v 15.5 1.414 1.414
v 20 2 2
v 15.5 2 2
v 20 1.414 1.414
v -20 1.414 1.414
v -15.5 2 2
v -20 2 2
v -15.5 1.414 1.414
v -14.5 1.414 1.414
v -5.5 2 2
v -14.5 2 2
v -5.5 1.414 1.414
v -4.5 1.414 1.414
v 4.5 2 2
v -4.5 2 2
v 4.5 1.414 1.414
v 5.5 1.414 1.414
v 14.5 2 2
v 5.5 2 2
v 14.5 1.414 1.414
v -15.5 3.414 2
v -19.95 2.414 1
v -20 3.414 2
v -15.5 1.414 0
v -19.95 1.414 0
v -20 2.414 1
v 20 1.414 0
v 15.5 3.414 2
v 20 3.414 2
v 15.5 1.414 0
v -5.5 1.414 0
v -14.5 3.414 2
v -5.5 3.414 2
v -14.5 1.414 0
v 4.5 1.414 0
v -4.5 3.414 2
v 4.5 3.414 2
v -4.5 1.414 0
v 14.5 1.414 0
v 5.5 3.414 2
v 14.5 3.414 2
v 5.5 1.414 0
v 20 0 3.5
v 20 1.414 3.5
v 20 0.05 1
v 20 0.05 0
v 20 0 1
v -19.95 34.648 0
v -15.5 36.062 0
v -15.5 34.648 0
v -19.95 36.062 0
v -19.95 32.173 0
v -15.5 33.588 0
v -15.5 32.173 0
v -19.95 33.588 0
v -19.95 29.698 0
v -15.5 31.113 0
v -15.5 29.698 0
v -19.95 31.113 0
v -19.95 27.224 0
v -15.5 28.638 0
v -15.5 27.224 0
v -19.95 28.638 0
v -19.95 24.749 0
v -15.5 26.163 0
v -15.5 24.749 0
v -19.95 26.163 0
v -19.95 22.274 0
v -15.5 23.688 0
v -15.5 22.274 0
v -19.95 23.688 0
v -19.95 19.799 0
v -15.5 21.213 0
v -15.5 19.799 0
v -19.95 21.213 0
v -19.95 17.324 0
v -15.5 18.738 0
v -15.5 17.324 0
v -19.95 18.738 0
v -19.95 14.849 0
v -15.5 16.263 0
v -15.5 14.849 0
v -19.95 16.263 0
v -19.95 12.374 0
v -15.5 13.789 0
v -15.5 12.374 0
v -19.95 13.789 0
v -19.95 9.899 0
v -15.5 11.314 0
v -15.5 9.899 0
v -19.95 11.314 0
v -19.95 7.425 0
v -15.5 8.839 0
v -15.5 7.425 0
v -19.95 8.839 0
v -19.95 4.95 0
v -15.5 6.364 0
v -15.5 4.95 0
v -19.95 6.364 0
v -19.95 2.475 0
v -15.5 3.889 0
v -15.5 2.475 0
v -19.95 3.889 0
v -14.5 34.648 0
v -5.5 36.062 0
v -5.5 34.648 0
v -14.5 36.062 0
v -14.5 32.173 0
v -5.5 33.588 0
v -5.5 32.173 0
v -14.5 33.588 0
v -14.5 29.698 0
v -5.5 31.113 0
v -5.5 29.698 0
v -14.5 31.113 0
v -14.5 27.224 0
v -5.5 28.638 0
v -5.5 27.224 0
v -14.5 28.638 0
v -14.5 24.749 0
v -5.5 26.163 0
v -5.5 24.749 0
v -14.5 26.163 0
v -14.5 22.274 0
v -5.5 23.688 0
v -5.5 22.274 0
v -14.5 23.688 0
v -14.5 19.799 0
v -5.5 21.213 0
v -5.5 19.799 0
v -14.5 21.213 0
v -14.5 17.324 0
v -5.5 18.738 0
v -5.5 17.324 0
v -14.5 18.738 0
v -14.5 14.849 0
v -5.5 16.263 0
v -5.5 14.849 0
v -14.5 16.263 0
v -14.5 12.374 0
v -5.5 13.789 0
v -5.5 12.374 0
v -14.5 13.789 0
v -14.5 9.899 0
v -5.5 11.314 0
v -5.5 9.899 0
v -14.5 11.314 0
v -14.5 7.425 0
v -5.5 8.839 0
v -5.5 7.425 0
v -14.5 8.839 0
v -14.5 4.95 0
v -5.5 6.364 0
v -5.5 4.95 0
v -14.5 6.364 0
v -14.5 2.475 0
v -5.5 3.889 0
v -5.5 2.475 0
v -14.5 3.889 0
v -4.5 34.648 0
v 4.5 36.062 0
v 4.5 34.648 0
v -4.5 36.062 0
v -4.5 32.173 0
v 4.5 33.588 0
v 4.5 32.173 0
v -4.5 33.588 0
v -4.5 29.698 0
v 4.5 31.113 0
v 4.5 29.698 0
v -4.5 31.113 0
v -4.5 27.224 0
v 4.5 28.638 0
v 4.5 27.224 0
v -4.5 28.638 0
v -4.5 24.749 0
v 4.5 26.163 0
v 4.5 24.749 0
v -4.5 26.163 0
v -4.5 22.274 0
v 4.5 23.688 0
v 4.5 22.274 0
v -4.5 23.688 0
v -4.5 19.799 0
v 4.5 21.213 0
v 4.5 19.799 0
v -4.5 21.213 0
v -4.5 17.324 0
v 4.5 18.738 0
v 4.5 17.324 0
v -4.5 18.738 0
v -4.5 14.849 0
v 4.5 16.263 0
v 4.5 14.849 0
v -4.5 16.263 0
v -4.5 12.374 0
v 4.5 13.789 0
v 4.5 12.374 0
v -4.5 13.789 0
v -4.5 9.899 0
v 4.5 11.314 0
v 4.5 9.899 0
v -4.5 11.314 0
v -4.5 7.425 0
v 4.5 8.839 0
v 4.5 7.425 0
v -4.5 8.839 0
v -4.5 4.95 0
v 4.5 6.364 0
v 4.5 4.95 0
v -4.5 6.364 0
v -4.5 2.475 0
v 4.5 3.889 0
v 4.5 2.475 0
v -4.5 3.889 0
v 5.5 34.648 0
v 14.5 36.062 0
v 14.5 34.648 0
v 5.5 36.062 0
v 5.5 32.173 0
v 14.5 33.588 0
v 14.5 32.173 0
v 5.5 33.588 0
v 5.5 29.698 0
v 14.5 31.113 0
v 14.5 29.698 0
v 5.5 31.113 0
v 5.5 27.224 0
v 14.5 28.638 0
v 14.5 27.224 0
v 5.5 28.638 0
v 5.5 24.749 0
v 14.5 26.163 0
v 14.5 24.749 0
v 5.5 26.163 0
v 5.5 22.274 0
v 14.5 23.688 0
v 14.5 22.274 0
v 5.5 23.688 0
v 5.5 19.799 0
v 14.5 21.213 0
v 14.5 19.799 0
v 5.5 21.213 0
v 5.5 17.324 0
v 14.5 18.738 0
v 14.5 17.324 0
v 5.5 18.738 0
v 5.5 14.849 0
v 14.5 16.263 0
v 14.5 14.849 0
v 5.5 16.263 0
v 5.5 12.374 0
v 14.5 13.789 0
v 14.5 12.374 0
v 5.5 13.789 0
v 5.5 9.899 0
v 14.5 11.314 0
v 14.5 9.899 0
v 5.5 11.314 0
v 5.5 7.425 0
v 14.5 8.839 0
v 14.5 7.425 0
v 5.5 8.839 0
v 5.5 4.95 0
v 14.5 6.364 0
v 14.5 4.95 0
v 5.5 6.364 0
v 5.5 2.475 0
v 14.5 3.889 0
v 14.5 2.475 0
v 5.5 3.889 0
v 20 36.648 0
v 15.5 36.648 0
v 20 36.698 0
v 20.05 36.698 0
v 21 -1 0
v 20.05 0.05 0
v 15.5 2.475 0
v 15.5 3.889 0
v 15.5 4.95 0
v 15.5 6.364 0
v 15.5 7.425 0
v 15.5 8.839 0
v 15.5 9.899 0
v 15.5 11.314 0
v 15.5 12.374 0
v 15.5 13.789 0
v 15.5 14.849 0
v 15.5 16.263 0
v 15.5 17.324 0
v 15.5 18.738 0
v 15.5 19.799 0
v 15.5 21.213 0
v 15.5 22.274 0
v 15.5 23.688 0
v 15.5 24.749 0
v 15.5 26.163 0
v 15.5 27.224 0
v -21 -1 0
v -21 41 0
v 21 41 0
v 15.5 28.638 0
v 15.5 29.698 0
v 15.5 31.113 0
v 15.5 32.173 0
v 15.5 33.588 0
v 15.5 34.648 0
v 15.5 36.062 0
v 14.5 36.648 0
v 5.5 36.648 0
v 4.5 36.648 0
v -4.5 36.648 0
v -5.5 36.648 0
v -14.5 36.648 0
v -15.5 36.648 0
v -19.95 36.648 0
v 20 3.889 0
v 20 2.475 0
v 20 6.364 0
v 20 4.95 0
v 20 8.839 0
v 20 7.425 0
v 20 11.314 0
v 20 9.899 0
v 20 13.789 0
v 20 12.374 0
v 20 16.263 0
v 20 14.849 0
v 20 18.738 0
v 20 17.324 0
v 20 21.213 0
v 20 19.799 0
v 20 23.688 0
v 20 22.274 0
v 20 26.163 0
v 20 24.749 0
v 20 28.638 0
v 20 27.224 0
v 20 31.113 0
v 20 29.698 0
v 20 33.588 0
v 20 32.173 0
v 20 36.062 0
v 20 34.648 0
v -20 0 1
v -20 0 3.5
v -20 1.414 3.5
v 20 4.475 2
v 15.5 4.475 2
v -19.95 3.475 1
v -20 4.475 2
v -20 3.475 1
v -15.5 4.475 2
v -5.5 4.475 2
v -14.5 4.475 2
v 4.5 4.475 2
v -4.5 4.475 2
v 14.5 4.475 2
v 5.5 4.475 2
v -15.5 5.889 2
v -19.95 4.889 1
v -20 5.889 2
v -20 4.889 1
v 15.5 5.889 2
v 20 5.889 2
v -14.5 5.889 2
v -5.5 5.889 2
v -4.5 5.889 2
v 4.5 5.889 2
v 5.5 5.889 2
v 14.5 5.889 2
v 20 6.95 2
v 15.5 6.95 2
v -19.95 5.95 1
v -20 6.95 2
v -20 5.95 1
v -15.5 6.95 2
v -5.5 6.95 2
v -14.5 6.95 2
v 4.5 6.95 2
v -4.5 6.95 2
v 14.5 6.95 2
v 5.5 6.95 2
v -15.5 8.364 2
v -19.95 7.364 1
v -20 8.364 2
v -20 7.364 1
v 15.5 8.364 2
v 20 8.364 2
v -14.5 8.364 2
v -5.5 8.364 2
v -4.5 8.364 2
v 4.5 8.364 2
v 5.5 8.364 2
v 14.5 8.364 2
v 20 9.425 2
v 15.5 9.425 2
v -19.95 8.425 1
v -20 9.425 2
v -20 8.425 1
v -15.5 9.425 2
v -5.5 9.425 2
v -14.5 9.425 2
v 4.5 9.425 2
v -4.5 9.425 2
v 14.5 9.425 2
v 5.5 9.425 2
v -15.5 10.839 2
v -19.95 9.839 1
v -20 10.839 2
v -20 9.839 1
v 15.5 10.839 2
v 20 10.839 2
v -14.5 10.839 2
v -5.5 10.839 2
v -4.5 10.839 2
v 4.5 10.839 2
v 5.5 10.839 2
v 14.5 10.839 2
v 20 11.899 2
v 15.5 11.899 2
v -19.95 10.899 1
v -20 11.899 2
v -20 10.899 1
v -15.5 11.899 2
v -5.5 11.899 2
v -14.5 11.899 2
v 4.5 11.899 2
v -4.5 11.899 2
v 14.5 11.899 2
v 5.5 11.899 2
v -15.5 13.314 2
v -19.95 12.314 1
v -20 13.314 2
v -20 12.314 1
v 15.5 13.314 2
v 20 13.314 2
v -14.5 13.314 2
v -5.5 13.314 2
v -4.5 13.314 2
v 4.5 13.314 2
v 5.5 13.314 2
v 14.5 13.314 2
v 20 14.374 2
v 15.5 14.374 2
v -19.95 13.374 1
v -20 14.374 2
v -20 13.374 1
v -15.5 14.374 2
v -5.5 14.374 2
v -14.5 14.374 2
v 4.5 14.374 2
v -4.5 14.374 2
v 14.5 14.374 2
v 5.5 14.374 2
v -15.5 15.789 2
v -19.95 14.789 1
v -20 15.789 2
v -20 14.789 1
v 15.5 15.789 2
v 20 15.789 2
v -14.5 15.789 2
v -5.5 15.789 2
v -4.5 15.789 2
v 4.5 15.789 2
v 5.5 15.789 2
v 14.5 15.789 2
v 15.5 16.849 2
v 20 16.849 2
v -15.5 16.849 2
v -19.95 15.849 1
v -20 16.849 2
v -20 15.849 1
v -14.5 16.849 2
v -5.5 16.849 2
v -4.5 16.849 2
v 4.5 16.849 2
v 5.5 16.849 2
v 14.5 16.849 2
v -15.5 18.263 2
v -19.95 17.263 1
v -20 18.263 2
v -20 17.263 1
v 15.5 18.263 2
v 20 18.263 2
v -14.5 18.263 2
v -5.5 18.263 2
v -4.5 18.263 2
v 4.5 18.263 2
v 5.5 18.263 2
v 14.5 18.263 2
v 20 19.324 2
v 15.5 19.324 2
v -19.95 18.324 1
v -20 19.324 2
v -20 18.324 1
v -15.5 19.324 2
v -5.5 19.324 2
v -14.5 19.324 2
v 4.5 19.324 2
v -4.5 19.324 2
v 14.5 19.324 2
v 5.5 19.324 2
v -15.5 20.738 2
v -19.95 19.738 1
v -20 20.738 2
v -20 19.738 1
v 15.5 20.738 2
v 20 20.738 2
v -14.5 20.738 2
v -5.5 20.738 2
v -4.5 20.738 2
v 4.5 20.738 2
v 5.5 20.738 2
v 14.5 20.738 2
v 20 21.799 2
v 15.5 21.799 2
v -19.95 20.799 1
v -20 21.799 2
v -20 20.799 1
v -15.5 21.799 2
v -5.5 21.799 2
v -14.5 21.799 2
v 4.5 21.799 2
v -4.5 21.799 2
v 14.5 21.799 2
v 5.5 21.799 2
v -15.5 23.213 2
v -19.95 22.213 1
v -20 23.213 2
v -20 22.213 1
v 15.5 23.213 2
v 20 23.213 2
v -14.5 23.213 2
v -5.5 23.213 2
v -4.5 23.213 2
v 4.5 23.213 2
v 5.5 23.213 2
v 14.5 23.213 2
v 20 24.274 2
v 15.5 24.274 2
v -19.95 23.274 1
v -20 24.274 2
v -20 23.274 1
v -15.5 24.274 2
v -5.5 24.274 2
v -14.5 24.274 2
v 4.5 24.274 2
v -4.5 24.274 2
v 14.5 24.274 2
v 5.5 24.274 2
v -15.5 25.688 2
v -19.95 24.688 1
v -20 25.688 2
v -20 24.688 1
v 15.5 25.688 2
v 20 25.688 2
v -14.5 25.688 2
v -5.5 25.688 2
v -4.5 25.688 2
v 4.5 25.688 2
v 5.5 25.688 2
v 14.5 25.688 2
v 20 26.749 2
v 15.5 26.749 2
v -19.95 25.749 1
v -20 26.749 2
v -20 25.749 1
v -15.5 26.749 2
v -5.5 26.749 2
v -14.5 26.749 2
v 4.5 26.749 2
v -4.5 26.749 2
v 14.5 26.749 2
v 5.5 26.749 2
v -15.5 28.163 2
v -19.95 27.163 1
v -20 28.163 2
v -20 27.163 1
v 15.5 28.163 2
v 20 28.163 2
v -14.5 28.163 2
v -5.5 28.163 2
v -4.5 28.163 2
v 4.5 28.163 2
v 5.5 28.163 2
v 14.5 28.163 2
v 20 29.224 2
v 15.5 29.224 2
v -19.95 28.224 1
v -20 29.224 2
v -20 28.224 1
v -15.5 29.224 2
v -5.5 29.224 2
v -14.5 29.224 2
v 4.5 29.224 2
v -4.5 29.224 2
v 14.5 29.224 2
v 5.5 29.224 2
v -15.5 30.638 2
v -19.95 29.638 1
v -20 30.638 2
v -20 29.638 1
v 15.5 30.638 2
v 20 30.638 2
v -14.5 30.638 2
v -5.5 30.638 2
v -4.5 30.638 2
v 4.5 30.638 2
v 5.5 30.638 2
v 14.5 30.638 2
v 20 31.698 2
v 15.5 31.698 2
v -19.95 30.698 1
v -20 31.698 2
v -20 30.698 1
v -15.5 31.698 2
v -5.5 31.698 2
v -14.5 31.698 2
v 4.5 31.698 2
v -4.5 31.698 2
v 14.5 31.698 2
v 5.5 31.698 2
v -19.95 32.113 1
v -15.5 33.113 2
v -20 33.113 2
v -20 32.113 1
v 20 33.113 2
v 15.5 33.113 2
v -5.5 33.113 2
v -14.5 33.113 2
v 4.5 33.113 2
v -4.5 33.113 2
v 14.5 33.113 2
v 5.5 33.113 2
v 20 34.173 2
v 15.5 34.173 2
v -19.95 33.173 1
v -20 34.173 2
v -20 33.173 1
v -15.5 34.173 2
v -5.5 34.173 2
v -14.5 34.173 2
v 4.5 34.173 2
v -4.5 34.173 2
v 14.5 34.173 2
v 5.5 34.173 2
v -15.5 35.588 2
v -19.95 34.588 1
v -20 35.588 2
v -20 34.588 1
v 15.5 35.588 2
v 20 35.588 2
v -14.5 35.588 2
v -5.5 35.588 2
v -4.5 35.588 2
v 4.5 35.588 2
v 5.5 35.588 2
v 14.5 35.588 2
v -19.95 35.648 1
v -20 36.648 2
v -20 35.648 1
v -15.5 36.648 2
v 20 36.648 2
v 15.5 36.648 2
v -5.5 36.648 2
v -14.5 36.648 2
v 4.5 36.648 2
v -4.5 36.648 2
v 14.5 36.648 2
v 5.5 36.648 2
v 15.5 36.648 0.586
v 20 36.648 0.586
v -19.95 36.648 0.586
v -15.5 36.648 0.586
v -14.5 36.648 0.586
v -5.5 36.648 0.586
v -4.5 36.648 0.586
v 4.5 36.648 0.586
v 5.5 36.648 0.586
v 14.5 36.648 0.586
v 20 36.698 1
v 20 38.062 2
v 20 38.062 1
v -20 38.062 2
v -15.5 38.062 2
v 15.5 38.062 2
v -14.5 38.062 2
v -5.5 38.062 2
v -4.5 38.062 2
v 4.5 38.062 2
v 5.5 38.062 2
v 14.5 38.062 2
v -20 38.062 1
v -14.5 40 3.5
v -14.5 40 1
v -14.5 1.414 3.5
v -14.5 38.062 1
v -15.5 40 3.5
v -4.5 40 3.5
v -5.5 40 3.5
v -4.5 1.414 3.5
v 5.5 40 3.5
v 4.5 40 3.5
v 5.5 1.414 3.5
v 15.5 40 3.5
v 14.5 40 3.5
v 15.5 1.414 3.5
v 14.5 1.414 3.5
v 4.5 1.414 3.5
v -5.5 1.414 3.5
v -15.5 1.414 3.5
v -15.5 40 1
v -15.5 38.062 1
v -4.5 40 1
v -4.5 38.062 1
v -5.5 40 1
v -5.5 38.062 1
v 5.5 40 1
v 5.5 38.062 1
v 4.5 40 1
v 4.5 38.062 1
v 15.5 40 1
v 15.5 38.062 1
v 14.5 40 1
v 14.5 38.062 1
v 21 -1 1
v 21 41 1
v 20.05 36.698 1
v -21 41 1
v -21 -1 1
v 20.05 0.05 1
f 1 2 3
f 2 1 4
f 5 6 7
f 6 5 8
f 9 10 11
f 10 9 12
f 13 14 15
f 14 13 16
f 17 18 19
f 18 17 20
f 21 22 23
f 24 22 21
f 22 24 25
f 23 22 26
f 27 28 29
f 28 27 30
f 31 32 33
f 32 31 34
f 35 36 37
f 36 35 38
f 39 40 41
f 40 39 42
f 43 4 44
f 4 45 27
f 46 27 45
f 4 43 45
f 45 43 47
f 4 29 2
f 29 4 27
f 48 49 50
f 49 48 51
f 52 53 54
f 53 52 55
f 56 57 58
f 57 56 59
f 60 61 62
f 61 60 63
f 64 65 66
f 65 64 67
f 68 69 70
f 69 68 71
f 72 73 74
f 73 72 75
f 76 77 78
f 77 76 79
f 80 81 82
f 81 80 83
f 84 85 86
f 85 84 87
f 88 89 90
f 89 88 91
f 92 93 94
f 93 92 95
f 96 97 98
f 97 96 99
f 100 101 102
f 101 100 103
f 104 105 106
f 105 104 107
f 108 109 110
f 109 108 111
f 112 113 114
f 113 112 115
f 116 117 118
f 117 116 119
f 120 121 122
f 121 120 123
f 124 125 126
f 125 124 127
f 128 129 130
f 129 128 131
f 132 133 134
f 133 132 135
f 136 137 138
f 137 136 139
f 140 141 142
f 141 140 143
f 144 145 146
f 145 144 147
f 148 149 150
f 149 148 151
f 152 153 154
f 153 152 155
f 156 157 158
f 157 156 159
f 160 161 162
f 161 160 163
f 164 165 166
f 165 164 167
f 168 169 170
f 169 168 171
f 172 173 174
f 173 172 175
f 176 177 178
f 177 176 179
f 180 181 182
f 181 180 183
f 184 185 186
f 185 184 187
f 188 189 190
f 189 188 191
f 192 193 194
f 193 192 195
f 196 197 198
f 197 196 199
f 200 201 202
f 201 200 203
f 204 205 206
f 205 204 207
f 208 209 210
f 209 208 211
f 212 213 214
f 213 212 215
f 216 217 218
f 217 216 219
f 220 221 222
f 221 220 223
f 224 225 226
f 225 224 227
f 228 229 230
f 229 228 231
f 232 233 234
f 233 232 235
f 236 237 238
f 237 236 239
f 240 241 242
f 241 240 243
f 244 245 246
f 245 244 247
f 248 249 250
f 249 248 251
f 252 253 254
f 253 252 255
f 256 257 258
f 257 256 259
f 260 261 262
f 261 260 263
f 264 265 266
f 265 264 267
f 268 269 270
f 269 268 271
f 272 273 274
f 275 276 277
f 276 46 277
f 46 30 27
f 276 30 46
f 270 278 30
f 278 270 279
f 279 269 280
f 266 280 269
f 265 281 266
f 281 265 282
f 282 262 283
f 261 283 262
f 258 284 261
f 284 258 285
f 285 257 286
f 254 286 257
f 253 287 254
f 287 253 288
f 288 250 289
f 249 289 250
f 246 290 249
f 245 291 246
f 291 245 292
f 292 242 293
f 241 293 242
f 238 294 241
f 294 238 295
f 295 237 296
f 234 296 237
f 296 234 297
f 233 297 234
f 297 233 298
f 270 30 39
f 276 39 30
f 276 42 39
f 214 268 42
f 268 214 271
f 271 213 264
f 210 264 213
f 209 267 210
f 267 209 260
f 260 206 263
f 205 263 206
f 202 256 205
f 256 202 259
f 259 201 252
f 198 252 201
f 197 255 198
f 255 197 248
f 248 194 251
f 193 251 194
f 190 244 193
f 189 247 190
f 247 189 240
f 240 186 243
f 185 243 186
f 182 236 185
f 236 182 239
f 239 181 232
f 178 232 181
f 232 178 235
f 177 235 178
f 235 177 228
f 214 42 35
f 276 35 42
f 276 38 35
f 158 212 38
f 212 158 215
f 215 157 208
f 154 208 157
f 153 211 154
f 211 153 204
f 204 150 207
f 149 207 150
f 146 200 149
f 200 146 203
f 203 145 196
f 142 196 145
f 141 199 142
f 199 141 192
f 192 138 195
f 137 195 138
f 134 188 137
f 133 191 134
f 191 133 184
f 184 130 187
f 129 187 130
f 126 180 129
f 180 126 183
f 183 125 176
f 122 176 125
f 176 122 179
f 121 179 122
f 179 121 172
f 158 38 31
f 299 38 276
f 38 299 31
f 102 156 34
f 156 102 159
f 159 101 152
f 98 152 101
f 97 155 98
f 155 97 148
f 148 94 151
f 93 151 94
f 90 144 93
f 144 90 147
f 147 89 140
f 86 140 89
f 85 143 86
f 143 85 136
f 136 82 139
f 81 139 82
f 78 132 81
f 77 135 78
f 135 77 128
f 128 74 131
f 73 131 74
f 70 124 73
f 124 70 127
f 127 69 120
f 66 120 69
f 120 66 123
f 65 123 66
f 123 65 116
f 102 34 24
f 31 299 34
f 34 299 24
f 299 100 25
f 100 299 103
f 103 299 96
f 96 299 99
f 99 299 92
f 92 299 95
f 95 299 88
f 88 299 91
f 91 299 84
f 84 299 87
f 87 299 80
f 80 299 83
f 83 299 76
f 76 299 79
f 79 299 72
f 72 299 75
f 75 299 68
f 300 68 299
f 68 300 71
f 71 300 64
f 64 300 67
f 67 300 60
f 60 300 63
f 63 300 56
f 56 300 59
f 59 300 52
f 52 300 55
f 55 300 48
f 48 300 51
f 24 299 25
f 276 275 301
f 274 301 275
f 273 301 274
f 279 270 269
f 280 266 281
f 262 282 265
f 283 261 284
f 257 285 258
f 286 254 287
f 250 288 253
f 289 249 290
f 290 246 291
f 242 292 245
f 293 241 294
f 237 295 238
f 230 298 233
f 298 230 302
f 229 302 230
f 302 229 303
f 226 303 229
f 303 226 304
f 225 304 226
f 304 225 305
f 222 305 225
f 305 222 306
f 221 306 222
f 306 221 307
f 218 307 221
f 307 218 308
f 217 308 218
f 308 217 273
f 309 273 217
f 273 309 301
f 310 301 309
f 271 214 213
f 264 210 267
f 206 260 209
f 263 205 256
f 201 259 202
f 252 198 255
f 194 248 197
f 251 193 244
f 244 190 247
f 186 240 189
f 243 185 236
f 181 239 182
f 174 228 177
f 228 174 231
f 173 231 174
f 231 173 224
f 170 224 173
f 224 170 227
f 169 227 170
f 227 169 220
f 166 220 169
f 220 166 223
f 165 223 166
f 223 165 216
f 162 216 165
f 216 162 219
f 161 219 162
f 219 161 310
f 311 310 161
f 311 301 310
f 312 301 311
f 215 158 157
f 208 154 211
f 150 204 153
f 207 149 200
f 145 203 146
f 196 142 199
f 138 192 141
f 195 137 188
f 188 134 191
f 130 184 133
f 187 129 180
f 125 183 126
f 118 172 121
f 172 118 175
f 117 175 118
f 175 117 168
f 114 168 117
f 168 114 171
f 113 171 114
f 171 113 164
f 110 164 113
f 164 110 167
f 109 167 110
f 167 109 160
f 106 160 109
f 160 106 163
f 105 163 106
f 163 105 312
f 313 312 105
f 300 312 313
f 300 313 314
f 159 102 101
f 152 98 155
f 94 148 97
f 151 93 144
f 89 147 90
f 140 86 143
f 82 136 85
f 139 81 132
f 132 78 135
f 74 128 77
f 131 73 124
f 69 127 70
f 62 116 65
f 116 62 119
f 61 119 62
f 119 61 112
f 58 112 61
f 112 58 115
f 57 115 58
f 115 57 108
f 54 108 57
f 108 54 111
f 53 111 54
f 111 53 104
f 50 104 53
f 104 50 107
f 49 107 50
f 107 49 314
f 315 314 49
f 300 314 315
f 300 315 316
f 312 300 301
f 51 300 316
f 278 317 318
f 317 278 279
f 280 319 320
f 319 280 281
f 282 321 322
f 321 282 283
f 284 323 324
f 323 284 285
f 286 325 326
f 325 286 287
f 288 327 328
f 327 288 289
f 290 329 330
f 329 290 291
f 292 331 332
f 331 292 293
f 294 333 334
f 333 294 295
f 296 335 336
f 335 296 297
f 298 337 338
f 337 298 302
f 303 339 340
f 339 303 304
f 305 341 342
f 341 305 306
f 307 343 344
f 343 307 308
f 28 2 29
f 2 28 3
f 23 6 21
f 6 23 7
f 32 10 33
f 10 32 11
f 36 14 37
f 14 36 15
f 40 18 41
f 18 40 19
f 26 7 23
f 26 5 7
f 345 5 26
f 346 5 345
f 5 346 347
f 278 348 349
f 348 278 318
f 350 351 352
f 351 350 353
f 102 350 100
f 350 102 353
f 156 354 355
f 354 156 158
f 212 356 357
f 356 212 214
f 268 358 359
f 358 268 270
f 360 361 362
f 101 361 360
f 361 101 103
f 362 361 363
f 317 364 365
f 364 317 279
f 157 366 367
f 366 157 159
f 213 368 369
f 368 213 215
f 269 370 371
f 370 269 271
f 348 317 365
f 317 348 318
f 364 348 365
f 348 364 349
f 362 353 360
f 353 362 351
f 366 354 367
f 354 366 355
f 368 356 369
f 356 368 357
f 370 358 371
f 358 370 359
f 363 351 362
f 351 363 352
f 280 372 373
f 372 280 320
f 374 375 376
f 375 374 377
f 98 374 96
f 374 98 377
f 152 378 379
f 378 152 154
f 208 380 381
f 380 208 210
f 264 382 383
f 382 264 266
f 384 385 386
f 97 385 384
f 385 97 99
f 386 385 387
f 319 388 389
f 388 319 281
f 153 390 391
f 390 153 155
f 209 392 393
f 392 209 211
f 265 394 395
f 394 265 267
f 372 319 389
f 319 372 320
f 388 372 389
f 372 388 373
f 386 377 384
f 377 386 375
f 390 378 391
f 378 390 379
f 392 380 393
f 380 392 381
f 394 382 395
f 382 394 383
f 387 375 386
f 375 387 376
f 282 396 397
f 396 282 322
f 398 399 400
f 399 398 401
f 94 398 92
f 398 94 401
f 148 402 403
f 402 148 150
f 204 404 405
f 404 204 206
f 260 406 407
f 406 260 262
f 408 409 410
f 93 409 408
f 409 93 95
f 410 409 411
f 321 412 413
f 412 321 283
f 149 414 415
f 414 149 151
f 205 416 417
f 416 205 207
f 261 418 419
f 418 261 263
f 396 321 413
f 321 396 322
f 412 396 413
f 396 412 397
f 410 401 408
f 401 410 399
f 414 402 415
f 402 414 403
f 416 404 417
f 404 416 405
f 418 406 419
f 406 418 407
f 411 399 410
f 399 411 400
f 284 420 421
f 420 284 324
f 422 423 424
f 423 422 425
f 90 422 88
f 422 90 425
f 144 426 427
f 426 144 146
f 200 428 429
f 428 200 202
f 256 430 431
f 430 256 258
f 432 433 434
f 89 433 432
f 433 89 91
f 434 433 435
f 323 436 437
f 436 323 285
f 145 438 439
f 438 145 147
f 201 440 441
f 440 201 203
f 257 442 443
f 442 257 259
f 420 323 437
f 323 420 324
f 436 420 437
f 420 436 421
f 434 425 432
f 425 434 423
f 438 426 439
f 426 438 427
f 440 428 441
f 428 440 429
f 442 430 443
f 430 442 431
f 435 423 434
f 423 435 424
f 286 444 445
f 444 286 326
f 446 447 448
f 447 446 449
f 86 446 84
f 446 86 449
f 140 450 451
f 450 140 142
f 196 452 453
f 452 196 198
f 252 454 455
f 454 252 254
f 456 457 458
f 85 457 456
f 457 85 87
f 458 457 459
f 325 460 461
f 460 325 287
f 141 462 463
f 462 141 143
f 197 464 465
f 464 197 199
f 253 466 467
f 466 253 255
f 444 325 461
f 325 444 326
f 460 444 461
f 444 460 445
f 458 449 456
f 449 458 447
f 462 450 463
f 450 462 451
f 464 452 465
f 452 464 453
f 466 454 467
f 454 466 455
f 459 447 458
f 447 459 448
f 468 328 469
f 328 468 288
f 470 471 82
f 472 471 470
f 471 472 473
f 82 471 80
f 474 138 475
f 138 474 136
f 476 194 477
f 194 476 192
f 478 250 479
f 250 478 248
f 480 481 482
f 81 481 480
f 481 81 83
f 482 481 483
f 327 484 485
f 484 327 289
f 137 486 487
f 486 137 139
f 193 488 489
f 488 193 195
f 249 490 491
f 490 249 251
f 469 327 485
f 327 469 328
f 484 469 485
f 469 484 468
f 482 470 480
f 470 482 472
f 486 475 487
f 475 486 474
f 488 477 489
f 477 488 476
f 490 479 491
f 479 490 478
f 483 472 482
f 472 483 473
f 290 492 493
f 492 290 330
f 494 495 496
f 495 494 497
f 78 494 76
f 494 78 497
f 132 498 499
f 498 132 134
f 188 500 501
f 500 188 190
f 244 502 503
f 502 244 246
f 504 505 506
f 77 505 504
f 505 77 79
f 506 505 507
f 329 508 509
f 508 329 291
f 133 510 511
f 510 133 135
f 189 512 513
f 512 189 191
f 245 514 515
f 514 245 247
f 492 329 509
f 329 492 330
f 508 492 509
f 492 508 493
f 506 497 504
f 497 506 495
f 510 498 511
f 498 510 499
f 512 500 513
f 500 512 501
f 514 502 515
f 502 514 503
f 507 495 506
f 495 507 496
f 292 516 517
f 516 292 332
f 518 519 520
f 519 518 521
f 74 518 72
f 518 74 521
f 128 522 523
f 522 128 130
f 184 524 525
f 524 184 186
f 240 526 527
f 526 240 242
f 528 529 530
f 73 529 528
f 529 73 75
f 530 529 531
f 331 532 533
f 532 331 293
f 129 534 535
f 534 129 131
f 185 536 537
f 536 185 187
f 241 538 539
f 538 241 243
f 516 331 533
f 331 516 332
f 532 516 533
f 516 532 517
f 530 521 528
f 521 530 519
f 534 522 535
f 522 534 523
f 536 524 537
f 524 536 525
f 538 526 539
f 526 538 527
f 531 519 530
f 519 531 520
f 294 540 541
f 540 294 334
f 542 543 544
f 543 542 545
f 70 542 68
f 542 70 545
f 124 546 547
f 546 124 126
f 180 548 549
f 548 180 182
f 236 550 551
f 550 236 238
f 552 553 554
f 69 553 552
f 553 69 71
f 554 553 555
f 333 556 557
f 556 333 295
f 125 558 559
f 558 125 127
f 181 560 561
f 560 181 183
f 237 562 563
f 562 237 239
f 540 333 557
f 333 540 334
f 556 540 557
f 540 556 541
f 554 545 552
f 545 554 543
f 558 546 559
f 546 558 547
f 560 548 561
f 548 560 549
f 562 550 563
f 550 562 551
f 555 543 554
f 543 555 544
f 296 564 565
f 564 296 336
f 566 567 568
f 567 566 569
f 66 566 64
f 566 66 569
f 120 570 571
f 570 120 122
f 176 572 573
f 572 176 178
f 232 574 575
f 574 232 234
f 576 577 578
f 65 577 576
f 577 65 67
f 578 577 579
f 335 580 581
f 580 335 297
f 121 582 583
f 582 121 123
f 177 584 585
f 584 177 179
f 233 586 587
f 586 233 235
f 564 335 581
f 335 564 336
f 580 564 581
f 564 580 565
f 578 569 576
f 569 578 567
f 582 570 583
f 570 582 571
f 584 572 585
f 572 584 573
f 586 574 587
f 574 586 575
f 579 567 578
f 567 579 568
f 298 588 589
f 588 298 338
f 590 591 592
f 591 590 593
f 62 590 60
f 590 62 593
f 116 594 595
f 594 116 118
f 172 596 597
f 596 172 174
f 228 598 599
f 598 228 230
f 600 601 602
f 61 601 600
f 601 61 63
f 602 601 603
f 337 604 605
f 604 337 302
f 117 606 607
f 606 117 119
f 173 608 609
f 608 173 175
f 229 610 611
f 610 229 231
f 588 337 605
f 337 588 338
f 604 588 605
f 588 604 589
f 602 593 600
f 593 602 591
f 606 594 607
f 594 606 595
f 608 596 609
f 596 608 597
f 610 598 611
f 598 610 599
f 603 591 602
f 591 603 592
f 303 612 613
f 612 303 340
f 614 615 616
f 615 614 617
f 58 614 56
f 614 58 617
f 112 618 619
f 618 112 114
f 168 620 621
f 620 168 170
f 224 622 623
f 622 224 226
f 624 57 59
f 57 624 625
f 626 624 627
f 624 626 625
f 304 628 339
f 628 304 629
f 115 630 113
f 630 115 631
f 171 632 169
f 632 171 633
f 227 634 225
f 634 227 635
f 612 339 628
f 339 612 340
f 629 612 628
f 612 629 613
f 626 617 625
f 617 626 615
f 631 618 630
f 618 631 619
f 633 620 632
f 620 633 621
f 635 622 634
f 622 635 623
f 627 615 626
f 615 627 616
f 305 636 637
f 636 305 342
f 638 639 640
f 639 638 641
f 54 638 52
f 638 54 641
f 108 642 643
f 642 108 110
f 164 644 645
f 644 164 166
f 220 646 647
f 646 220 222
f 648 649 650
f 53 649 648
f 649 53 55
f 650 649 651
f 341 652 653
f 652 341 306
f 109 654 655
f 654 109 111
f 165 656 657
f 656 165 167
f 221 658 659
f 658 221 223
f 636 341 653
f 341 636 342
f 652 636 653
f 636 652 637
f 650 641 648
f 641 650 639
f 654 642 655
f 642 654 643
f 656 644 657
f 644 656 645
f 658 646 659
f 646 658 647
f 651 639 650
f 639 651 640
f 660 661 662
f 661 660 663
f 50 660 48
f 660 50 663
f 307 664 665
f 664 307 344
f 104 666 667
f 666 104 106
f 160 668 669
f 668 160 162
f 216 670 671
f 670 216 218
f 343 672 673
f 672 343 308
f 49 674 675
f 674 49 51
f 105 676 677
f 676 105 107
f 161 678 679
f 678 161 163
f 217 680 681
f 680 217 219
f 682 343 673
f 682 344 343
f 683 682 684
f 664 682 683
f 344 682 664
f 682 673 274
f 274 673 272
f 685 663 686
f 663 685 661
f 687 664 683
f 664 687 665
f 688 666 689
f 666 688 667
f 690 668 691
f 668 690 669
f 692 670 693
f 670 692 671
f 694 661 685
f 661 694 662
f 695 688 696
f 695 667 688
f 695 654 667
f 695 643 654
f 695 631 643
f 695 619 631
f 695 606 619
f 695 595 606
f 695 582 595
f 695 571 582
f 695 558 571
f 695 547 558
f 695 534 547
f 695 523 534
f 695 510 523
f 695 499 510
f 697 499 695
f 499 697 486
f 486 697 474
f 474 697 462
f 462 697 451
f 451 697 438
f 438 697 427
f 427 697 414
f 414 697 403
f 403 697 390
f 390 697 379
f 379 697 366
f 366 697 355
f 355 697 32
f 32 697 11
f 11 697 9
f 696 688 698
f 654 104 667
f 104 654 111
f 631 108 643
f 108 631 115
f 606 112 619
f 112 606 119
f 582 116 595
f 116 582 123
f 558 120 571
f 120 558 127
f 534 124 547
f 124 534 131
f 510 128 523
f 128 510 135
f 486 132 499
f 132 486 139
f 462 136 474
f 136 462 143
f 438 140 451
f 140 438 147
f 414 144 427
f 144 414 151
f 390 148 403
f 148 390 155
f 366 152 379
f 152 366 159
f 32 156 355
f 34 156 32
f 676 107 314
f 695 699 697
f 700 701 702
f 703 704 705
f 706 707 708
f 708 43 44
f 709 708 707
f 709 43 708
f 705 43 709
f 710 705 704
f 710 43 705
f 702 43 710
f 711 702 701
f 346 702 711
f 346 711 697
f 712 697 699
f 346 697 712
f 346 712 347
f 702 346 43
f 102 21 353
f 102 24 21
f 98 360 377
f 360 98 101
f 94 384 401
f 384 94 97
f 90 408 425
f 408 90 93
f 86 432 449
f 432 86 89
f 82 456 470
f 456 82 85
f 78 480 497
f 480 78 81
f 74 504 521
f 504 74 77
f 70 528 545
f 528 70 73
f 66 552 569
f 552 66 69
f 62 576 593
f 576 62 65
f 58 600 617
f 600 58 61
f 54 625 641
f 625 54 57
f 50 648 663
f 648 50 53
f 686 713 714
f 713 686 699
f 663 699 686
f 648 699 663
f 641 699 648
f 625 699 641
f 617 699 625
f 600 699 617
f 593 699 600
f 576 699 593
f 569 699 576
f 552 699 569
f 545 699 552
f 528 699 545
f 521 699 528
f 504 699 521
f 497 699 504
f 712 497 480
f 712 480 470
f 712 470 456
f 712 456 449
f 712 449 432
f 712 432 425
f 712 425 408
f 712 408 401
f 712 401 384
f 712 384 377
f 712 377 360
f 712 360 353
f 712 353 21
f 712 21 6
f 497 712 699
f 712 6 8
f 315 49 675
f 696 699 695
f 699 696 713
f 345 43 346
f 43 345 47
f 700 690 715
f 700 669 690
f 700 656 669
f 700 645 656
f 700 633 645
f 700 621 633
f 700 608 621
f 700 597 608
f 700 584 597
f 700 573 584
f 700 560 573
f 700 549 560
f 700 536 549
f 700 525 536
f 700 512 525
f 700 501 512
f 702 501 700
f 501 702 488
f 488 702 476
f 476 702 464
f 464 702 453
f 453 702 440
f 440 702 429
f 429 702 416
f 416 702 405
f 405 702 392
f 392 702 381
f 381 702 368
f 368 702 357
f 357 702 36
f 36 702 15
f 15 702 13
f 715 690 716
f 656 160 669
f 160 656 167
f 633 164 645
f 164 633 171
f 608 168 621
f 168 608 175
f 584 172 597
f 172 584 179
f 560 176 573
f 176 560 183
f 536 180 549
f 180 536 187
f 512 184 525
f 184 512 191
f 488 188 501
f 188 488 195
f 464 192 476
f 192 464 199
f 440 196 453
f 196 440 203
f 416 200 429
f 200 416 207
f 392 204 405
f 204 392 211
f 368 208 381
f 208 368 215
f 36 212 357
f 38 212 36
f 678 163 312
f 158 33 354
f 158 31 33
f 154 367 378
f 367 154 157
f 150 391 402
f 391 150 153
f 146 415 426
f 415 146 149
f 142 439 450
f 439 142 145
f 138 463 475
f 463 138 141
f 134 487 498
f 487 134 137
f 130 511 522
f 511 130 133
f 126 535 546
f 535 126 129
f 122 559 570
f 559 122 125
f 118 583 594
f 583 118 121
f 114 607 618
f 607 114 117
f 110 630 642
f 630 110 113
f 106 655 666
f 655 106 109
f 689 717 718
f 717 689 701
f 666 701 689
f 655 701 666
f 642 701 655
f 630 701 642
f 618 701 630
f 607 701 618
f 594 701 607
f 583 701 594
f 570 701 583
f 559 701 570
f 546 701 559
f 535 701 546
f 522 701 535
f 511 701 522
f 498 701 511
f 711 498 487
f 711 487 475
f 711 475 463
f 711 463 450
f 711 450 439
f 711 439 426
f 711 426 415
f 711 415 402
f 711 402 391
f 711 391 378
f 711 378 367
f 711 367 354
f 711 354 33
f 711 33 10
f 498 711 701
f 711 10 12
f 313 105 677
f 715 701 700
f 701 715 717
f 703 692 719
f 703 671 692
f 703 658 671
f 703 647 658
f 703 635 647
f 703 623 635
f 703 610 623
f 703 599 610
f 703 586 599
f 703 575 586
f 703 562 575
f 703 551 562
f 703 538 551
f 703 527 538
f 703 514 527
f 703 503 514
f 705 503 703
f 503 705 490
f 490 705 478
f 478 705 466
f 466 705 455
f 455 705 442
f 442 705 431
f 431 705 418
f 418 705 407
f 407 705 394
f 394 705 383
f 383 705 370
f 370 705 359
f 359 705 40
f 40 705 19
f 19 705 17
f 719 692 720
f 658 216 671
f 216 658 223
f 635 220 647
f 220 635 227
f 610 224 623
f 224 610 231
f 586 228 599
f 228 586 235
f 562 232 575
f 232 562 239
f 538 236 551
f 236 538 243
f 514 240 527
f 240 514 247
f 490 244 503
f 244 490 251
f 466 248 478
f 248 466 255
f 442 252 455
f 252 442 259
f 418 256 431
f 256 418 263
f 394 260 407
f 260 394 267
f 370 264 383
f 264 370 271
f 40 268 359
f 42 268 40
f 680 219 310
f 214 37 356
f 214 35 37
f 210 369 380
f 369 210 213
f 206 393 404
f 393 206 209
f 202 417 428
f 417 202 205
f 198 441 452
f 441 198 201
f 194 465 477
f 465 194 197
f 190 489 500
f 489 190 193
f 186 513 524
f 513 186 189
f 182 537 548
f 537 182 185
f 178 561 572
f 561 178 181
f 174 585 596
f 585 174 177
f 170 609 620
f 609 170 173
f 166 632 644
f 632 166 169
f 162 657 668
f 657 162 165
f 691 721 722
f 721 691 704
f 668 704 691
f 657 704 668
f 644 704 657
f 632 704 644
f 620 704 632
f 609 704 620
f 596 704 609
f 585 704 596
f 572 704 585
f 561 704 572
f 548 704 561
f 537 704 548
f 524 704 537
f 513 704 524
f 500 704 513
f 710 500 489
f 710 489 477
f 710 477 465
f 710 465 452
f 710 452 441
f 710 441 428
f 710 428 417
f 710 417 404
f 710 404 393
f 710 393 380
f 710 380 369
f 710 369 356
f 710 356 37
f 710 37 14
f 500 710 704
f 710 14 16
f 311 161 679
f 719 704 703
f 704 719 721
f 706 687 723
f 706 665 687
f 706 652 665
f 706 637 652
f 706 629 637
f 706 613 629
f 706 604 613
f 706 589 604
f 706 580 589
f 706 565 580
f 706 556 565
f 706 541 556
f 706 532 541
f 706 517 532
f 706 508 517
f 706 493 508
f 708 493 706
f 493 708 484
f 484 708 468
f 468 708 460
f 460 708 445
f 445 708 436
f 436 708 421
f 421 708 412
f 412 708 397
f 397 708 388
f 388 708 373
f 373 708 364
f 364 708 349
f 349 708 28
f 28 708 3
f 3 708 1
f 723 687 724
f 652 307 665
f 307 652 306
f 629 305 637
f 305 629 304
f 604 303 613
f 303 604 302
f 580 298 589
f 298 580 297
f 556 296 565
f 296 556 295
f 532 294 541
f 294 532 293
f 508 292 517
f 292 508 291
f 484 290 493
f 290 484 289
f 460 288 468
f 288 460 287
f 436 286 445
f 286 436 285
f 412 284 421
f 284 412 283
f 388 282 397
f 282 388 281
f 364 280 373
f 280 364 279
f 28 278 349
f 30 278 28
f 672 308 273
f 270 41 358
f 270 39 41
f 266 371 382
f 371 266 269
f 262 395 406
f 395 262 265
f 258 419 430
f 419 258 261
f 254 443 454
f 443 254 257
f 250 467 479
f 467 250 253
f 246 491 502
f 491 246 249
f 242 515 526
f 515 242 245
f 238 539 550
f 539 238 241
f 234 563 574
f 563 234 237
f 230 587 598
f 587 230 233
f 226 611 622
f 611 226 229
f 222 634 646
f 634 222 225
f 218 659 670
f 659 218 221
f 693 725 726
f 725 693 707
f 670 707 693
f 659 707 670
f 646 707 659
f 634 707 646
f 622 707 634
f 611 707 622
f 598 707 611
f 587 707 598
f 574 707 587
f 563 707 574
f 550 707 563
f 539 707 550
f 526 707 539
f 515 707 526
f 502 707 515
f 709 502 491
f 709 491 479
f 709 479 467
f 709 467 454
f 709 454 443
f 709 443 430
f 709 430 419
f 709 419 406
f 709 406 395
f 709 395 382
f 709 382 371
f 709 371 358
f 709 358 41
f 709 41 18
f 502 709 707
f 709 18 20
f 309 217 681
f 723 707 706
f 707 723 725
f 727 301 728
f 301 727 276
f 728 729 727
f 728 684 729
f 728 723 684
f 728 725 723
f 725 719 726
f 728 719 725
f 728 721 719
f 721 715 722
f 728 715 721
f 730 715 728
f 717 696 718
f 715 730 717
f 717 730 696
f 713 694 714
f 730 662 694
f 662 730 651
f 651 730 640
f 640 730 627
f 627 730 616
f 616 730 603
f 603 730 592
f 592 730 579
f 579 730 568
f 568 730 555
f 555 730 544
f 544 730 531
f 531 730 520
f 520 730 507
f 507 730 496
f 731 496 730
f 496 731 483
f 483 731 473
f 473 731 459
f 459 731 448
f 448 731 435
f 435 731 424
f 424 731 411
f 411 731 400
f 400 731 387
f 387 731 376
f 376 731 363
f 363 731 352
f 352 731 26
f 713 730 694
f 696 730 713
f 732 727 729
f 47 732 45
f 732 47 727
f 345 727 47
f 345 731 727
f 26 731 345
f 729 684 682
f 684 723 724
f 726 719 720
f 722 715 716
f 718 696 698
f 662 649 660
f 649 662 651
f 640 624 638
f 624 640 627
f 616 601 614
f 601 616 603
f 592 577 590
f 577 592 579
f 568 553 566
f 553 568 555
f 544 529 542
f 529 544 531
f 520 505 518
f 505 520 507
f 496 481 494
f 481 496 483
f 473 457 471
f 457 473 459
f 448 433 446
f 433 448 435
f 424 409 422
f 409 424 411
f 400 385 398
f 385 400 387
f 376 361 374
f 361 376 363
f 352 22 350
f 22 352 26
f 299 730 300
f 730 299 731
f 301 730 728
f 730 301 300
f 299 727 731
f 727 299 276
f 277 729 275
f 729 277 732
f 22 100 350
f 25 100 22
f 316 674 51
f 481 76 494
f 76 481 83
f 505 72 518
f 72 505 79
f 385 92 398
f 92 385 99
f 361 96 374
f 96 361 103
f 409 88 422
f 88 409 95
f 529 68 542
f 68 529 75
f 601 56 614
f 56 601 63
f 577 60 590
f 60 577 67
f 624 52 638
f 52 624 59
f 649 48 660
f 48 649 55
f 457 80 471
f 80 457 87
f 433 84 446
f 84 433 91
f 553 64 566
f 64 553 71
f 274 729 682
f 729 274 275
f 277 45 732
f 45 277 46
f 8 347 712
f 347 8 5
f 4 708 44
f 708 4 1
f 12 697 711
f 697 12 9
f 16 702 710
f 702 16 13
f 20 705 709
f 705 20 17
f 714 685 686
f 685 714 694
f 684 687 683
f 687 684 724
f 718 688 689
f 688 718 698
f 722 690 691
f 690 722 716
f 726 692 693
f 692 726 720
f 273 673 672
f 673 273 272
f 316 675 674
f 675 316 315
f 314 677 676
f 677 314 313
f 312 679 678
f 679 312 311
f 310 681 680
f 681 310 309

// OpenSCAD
// date: 2014
// author: Lukas Süss aka mechadense
// license: CC BY
// title: customizable fishbone lamella gas seperation grid for electrolysis

/*

This is a halve grid for gas separation in an electrolysis apparatus.  
When two (mirrored versions) of these are put together back on back the lamellas form herringbone shapes. This disallows the gasses to pass from one side to the other and mix.  
In a concrete application a gas separation wall must be extended upwards and the fluid level must be always kept above the grid.  

Standalone this thing is incomplete. An electrolysis chamber capable of gas separation is needed in conjunction. It might be a good idea to design the gas splitter top as one piece print with mainly diagonal surfaces to archive maximum gas tightness.  

pros & cons:  
+ no separation membranes (filterpaper / 0.1mm mesh fine lye resistant textiles) needed   
+ if separation membranes are used nonetheless they are mechanically stabilized by the grid  
- more distance between the plates (resistive losses) more electrolyte needed  
- less water cross section between plates  

Some data randomly found on the net (no guarantee of correctness):  
* 1.5mm to (2.0mm) for bubble-flow needed  
* keep current below 85mA/cm^2 of plate area  
* try to archive 2V voltage drop per plate  
* => six plates in series are useful:  
connect only the outermost two for 12V operation and  
connect only the second from outermost for for 9V operation 
 
One side can be made to have no slide-in border so that one can look in when a transparent window is glued onto the chamber.

*/



/* [main] */

// grid width without slidein rim
w = 40;
// grid height without slidein rim
h = 40;

angle = 45; // 0° no arrow shape
// halve fishbone lamella thickness

part = "symmetrical"; //[left,right,symmetrical]


/* [halve herringbone] */

// halve herringbone thickness
s2 = 2;
sft = s2/tan(angle);

// rib thickness
trib = 1;
// gap size between ribs
tgap = 0.75;

t1 = trib/sin(angle);
t2 = tgap/sin(angle);

// number of lamellas
n = floor(h/(t1+t2))-1; // -1 ... good working hack
heff = (n-1)*(t1+t2)+sft;



/* [connector spacer bars] */

// thickness of connector bars
tconn = 1;
// distance between connector bars
aconn = 10;
// space for gas bubbles to rise up
tbubble = 1.5;
// offset for the first connector bar
shiftconn = 4.5;
nconn = floor(h/aconn);


/* [slidein rim] */

// thickness of slidein rim - countergrooves must be more than double that wide (herringbonehalve - optional filterpaper - herringbonehavle)
tslidein = 1;
// depth of slidein rim - how far it goes in
sslidein = 1;


eps = 0.05*1;



// ###############

// size estimation cube
//translate([0,0,20])cube([10,10,10]);

part();

module part()
{
  if(part=="left") {translate([-w/2,0,0]) halvegrid("no");}
  if(part=="right") {translate([+w/2,0,0]) scale([-1,1,1]) halvegrid("no");}
  if(part=="symmetrical") {translate([-w/2,0,0]) halvegrid("yes");}

}

//



module halvegrid(slidein="yes")
{

for(i=[0:n-1])
{
  translate([0,i*(t1+t2),0])
  scale([1,1,-1])rotate(+90,[0,1,0])
  linear_extrude(height=w)
  polygon(points=[[0,0],[0,t1],[s2,t1+sft],[s2,sft]], paths=[[0,1,2,3]]);
}

for(i=[0:nconn-1])
{
  translate([aconn*i+shiftconn,0,0])
  cube([tconn,h,s2+tbubble]);
}

//bottom end
cube([w,t1,s2+tbubble]);
// top end
translate([0,heff,-0.1*0])
cube([w,t1,s2]);

difference()
{
  // sicrumdference slidein ring
  if(slidein=="no")
  {
    translate([-sslidein,-sslidein,0])
      color("orange") cube([w+sslidein-eps,h+sslidein*2,tslidein]);
  }
  else
  {
    translate([-sslidein,-sslidein,0])
      color("orange") cube([w+sslidein*2,h+sslidein*2,tslidein]);
  }

  translate([eps,eps,-1])
    cube([w,heff,tslidein+3]);
}
}
